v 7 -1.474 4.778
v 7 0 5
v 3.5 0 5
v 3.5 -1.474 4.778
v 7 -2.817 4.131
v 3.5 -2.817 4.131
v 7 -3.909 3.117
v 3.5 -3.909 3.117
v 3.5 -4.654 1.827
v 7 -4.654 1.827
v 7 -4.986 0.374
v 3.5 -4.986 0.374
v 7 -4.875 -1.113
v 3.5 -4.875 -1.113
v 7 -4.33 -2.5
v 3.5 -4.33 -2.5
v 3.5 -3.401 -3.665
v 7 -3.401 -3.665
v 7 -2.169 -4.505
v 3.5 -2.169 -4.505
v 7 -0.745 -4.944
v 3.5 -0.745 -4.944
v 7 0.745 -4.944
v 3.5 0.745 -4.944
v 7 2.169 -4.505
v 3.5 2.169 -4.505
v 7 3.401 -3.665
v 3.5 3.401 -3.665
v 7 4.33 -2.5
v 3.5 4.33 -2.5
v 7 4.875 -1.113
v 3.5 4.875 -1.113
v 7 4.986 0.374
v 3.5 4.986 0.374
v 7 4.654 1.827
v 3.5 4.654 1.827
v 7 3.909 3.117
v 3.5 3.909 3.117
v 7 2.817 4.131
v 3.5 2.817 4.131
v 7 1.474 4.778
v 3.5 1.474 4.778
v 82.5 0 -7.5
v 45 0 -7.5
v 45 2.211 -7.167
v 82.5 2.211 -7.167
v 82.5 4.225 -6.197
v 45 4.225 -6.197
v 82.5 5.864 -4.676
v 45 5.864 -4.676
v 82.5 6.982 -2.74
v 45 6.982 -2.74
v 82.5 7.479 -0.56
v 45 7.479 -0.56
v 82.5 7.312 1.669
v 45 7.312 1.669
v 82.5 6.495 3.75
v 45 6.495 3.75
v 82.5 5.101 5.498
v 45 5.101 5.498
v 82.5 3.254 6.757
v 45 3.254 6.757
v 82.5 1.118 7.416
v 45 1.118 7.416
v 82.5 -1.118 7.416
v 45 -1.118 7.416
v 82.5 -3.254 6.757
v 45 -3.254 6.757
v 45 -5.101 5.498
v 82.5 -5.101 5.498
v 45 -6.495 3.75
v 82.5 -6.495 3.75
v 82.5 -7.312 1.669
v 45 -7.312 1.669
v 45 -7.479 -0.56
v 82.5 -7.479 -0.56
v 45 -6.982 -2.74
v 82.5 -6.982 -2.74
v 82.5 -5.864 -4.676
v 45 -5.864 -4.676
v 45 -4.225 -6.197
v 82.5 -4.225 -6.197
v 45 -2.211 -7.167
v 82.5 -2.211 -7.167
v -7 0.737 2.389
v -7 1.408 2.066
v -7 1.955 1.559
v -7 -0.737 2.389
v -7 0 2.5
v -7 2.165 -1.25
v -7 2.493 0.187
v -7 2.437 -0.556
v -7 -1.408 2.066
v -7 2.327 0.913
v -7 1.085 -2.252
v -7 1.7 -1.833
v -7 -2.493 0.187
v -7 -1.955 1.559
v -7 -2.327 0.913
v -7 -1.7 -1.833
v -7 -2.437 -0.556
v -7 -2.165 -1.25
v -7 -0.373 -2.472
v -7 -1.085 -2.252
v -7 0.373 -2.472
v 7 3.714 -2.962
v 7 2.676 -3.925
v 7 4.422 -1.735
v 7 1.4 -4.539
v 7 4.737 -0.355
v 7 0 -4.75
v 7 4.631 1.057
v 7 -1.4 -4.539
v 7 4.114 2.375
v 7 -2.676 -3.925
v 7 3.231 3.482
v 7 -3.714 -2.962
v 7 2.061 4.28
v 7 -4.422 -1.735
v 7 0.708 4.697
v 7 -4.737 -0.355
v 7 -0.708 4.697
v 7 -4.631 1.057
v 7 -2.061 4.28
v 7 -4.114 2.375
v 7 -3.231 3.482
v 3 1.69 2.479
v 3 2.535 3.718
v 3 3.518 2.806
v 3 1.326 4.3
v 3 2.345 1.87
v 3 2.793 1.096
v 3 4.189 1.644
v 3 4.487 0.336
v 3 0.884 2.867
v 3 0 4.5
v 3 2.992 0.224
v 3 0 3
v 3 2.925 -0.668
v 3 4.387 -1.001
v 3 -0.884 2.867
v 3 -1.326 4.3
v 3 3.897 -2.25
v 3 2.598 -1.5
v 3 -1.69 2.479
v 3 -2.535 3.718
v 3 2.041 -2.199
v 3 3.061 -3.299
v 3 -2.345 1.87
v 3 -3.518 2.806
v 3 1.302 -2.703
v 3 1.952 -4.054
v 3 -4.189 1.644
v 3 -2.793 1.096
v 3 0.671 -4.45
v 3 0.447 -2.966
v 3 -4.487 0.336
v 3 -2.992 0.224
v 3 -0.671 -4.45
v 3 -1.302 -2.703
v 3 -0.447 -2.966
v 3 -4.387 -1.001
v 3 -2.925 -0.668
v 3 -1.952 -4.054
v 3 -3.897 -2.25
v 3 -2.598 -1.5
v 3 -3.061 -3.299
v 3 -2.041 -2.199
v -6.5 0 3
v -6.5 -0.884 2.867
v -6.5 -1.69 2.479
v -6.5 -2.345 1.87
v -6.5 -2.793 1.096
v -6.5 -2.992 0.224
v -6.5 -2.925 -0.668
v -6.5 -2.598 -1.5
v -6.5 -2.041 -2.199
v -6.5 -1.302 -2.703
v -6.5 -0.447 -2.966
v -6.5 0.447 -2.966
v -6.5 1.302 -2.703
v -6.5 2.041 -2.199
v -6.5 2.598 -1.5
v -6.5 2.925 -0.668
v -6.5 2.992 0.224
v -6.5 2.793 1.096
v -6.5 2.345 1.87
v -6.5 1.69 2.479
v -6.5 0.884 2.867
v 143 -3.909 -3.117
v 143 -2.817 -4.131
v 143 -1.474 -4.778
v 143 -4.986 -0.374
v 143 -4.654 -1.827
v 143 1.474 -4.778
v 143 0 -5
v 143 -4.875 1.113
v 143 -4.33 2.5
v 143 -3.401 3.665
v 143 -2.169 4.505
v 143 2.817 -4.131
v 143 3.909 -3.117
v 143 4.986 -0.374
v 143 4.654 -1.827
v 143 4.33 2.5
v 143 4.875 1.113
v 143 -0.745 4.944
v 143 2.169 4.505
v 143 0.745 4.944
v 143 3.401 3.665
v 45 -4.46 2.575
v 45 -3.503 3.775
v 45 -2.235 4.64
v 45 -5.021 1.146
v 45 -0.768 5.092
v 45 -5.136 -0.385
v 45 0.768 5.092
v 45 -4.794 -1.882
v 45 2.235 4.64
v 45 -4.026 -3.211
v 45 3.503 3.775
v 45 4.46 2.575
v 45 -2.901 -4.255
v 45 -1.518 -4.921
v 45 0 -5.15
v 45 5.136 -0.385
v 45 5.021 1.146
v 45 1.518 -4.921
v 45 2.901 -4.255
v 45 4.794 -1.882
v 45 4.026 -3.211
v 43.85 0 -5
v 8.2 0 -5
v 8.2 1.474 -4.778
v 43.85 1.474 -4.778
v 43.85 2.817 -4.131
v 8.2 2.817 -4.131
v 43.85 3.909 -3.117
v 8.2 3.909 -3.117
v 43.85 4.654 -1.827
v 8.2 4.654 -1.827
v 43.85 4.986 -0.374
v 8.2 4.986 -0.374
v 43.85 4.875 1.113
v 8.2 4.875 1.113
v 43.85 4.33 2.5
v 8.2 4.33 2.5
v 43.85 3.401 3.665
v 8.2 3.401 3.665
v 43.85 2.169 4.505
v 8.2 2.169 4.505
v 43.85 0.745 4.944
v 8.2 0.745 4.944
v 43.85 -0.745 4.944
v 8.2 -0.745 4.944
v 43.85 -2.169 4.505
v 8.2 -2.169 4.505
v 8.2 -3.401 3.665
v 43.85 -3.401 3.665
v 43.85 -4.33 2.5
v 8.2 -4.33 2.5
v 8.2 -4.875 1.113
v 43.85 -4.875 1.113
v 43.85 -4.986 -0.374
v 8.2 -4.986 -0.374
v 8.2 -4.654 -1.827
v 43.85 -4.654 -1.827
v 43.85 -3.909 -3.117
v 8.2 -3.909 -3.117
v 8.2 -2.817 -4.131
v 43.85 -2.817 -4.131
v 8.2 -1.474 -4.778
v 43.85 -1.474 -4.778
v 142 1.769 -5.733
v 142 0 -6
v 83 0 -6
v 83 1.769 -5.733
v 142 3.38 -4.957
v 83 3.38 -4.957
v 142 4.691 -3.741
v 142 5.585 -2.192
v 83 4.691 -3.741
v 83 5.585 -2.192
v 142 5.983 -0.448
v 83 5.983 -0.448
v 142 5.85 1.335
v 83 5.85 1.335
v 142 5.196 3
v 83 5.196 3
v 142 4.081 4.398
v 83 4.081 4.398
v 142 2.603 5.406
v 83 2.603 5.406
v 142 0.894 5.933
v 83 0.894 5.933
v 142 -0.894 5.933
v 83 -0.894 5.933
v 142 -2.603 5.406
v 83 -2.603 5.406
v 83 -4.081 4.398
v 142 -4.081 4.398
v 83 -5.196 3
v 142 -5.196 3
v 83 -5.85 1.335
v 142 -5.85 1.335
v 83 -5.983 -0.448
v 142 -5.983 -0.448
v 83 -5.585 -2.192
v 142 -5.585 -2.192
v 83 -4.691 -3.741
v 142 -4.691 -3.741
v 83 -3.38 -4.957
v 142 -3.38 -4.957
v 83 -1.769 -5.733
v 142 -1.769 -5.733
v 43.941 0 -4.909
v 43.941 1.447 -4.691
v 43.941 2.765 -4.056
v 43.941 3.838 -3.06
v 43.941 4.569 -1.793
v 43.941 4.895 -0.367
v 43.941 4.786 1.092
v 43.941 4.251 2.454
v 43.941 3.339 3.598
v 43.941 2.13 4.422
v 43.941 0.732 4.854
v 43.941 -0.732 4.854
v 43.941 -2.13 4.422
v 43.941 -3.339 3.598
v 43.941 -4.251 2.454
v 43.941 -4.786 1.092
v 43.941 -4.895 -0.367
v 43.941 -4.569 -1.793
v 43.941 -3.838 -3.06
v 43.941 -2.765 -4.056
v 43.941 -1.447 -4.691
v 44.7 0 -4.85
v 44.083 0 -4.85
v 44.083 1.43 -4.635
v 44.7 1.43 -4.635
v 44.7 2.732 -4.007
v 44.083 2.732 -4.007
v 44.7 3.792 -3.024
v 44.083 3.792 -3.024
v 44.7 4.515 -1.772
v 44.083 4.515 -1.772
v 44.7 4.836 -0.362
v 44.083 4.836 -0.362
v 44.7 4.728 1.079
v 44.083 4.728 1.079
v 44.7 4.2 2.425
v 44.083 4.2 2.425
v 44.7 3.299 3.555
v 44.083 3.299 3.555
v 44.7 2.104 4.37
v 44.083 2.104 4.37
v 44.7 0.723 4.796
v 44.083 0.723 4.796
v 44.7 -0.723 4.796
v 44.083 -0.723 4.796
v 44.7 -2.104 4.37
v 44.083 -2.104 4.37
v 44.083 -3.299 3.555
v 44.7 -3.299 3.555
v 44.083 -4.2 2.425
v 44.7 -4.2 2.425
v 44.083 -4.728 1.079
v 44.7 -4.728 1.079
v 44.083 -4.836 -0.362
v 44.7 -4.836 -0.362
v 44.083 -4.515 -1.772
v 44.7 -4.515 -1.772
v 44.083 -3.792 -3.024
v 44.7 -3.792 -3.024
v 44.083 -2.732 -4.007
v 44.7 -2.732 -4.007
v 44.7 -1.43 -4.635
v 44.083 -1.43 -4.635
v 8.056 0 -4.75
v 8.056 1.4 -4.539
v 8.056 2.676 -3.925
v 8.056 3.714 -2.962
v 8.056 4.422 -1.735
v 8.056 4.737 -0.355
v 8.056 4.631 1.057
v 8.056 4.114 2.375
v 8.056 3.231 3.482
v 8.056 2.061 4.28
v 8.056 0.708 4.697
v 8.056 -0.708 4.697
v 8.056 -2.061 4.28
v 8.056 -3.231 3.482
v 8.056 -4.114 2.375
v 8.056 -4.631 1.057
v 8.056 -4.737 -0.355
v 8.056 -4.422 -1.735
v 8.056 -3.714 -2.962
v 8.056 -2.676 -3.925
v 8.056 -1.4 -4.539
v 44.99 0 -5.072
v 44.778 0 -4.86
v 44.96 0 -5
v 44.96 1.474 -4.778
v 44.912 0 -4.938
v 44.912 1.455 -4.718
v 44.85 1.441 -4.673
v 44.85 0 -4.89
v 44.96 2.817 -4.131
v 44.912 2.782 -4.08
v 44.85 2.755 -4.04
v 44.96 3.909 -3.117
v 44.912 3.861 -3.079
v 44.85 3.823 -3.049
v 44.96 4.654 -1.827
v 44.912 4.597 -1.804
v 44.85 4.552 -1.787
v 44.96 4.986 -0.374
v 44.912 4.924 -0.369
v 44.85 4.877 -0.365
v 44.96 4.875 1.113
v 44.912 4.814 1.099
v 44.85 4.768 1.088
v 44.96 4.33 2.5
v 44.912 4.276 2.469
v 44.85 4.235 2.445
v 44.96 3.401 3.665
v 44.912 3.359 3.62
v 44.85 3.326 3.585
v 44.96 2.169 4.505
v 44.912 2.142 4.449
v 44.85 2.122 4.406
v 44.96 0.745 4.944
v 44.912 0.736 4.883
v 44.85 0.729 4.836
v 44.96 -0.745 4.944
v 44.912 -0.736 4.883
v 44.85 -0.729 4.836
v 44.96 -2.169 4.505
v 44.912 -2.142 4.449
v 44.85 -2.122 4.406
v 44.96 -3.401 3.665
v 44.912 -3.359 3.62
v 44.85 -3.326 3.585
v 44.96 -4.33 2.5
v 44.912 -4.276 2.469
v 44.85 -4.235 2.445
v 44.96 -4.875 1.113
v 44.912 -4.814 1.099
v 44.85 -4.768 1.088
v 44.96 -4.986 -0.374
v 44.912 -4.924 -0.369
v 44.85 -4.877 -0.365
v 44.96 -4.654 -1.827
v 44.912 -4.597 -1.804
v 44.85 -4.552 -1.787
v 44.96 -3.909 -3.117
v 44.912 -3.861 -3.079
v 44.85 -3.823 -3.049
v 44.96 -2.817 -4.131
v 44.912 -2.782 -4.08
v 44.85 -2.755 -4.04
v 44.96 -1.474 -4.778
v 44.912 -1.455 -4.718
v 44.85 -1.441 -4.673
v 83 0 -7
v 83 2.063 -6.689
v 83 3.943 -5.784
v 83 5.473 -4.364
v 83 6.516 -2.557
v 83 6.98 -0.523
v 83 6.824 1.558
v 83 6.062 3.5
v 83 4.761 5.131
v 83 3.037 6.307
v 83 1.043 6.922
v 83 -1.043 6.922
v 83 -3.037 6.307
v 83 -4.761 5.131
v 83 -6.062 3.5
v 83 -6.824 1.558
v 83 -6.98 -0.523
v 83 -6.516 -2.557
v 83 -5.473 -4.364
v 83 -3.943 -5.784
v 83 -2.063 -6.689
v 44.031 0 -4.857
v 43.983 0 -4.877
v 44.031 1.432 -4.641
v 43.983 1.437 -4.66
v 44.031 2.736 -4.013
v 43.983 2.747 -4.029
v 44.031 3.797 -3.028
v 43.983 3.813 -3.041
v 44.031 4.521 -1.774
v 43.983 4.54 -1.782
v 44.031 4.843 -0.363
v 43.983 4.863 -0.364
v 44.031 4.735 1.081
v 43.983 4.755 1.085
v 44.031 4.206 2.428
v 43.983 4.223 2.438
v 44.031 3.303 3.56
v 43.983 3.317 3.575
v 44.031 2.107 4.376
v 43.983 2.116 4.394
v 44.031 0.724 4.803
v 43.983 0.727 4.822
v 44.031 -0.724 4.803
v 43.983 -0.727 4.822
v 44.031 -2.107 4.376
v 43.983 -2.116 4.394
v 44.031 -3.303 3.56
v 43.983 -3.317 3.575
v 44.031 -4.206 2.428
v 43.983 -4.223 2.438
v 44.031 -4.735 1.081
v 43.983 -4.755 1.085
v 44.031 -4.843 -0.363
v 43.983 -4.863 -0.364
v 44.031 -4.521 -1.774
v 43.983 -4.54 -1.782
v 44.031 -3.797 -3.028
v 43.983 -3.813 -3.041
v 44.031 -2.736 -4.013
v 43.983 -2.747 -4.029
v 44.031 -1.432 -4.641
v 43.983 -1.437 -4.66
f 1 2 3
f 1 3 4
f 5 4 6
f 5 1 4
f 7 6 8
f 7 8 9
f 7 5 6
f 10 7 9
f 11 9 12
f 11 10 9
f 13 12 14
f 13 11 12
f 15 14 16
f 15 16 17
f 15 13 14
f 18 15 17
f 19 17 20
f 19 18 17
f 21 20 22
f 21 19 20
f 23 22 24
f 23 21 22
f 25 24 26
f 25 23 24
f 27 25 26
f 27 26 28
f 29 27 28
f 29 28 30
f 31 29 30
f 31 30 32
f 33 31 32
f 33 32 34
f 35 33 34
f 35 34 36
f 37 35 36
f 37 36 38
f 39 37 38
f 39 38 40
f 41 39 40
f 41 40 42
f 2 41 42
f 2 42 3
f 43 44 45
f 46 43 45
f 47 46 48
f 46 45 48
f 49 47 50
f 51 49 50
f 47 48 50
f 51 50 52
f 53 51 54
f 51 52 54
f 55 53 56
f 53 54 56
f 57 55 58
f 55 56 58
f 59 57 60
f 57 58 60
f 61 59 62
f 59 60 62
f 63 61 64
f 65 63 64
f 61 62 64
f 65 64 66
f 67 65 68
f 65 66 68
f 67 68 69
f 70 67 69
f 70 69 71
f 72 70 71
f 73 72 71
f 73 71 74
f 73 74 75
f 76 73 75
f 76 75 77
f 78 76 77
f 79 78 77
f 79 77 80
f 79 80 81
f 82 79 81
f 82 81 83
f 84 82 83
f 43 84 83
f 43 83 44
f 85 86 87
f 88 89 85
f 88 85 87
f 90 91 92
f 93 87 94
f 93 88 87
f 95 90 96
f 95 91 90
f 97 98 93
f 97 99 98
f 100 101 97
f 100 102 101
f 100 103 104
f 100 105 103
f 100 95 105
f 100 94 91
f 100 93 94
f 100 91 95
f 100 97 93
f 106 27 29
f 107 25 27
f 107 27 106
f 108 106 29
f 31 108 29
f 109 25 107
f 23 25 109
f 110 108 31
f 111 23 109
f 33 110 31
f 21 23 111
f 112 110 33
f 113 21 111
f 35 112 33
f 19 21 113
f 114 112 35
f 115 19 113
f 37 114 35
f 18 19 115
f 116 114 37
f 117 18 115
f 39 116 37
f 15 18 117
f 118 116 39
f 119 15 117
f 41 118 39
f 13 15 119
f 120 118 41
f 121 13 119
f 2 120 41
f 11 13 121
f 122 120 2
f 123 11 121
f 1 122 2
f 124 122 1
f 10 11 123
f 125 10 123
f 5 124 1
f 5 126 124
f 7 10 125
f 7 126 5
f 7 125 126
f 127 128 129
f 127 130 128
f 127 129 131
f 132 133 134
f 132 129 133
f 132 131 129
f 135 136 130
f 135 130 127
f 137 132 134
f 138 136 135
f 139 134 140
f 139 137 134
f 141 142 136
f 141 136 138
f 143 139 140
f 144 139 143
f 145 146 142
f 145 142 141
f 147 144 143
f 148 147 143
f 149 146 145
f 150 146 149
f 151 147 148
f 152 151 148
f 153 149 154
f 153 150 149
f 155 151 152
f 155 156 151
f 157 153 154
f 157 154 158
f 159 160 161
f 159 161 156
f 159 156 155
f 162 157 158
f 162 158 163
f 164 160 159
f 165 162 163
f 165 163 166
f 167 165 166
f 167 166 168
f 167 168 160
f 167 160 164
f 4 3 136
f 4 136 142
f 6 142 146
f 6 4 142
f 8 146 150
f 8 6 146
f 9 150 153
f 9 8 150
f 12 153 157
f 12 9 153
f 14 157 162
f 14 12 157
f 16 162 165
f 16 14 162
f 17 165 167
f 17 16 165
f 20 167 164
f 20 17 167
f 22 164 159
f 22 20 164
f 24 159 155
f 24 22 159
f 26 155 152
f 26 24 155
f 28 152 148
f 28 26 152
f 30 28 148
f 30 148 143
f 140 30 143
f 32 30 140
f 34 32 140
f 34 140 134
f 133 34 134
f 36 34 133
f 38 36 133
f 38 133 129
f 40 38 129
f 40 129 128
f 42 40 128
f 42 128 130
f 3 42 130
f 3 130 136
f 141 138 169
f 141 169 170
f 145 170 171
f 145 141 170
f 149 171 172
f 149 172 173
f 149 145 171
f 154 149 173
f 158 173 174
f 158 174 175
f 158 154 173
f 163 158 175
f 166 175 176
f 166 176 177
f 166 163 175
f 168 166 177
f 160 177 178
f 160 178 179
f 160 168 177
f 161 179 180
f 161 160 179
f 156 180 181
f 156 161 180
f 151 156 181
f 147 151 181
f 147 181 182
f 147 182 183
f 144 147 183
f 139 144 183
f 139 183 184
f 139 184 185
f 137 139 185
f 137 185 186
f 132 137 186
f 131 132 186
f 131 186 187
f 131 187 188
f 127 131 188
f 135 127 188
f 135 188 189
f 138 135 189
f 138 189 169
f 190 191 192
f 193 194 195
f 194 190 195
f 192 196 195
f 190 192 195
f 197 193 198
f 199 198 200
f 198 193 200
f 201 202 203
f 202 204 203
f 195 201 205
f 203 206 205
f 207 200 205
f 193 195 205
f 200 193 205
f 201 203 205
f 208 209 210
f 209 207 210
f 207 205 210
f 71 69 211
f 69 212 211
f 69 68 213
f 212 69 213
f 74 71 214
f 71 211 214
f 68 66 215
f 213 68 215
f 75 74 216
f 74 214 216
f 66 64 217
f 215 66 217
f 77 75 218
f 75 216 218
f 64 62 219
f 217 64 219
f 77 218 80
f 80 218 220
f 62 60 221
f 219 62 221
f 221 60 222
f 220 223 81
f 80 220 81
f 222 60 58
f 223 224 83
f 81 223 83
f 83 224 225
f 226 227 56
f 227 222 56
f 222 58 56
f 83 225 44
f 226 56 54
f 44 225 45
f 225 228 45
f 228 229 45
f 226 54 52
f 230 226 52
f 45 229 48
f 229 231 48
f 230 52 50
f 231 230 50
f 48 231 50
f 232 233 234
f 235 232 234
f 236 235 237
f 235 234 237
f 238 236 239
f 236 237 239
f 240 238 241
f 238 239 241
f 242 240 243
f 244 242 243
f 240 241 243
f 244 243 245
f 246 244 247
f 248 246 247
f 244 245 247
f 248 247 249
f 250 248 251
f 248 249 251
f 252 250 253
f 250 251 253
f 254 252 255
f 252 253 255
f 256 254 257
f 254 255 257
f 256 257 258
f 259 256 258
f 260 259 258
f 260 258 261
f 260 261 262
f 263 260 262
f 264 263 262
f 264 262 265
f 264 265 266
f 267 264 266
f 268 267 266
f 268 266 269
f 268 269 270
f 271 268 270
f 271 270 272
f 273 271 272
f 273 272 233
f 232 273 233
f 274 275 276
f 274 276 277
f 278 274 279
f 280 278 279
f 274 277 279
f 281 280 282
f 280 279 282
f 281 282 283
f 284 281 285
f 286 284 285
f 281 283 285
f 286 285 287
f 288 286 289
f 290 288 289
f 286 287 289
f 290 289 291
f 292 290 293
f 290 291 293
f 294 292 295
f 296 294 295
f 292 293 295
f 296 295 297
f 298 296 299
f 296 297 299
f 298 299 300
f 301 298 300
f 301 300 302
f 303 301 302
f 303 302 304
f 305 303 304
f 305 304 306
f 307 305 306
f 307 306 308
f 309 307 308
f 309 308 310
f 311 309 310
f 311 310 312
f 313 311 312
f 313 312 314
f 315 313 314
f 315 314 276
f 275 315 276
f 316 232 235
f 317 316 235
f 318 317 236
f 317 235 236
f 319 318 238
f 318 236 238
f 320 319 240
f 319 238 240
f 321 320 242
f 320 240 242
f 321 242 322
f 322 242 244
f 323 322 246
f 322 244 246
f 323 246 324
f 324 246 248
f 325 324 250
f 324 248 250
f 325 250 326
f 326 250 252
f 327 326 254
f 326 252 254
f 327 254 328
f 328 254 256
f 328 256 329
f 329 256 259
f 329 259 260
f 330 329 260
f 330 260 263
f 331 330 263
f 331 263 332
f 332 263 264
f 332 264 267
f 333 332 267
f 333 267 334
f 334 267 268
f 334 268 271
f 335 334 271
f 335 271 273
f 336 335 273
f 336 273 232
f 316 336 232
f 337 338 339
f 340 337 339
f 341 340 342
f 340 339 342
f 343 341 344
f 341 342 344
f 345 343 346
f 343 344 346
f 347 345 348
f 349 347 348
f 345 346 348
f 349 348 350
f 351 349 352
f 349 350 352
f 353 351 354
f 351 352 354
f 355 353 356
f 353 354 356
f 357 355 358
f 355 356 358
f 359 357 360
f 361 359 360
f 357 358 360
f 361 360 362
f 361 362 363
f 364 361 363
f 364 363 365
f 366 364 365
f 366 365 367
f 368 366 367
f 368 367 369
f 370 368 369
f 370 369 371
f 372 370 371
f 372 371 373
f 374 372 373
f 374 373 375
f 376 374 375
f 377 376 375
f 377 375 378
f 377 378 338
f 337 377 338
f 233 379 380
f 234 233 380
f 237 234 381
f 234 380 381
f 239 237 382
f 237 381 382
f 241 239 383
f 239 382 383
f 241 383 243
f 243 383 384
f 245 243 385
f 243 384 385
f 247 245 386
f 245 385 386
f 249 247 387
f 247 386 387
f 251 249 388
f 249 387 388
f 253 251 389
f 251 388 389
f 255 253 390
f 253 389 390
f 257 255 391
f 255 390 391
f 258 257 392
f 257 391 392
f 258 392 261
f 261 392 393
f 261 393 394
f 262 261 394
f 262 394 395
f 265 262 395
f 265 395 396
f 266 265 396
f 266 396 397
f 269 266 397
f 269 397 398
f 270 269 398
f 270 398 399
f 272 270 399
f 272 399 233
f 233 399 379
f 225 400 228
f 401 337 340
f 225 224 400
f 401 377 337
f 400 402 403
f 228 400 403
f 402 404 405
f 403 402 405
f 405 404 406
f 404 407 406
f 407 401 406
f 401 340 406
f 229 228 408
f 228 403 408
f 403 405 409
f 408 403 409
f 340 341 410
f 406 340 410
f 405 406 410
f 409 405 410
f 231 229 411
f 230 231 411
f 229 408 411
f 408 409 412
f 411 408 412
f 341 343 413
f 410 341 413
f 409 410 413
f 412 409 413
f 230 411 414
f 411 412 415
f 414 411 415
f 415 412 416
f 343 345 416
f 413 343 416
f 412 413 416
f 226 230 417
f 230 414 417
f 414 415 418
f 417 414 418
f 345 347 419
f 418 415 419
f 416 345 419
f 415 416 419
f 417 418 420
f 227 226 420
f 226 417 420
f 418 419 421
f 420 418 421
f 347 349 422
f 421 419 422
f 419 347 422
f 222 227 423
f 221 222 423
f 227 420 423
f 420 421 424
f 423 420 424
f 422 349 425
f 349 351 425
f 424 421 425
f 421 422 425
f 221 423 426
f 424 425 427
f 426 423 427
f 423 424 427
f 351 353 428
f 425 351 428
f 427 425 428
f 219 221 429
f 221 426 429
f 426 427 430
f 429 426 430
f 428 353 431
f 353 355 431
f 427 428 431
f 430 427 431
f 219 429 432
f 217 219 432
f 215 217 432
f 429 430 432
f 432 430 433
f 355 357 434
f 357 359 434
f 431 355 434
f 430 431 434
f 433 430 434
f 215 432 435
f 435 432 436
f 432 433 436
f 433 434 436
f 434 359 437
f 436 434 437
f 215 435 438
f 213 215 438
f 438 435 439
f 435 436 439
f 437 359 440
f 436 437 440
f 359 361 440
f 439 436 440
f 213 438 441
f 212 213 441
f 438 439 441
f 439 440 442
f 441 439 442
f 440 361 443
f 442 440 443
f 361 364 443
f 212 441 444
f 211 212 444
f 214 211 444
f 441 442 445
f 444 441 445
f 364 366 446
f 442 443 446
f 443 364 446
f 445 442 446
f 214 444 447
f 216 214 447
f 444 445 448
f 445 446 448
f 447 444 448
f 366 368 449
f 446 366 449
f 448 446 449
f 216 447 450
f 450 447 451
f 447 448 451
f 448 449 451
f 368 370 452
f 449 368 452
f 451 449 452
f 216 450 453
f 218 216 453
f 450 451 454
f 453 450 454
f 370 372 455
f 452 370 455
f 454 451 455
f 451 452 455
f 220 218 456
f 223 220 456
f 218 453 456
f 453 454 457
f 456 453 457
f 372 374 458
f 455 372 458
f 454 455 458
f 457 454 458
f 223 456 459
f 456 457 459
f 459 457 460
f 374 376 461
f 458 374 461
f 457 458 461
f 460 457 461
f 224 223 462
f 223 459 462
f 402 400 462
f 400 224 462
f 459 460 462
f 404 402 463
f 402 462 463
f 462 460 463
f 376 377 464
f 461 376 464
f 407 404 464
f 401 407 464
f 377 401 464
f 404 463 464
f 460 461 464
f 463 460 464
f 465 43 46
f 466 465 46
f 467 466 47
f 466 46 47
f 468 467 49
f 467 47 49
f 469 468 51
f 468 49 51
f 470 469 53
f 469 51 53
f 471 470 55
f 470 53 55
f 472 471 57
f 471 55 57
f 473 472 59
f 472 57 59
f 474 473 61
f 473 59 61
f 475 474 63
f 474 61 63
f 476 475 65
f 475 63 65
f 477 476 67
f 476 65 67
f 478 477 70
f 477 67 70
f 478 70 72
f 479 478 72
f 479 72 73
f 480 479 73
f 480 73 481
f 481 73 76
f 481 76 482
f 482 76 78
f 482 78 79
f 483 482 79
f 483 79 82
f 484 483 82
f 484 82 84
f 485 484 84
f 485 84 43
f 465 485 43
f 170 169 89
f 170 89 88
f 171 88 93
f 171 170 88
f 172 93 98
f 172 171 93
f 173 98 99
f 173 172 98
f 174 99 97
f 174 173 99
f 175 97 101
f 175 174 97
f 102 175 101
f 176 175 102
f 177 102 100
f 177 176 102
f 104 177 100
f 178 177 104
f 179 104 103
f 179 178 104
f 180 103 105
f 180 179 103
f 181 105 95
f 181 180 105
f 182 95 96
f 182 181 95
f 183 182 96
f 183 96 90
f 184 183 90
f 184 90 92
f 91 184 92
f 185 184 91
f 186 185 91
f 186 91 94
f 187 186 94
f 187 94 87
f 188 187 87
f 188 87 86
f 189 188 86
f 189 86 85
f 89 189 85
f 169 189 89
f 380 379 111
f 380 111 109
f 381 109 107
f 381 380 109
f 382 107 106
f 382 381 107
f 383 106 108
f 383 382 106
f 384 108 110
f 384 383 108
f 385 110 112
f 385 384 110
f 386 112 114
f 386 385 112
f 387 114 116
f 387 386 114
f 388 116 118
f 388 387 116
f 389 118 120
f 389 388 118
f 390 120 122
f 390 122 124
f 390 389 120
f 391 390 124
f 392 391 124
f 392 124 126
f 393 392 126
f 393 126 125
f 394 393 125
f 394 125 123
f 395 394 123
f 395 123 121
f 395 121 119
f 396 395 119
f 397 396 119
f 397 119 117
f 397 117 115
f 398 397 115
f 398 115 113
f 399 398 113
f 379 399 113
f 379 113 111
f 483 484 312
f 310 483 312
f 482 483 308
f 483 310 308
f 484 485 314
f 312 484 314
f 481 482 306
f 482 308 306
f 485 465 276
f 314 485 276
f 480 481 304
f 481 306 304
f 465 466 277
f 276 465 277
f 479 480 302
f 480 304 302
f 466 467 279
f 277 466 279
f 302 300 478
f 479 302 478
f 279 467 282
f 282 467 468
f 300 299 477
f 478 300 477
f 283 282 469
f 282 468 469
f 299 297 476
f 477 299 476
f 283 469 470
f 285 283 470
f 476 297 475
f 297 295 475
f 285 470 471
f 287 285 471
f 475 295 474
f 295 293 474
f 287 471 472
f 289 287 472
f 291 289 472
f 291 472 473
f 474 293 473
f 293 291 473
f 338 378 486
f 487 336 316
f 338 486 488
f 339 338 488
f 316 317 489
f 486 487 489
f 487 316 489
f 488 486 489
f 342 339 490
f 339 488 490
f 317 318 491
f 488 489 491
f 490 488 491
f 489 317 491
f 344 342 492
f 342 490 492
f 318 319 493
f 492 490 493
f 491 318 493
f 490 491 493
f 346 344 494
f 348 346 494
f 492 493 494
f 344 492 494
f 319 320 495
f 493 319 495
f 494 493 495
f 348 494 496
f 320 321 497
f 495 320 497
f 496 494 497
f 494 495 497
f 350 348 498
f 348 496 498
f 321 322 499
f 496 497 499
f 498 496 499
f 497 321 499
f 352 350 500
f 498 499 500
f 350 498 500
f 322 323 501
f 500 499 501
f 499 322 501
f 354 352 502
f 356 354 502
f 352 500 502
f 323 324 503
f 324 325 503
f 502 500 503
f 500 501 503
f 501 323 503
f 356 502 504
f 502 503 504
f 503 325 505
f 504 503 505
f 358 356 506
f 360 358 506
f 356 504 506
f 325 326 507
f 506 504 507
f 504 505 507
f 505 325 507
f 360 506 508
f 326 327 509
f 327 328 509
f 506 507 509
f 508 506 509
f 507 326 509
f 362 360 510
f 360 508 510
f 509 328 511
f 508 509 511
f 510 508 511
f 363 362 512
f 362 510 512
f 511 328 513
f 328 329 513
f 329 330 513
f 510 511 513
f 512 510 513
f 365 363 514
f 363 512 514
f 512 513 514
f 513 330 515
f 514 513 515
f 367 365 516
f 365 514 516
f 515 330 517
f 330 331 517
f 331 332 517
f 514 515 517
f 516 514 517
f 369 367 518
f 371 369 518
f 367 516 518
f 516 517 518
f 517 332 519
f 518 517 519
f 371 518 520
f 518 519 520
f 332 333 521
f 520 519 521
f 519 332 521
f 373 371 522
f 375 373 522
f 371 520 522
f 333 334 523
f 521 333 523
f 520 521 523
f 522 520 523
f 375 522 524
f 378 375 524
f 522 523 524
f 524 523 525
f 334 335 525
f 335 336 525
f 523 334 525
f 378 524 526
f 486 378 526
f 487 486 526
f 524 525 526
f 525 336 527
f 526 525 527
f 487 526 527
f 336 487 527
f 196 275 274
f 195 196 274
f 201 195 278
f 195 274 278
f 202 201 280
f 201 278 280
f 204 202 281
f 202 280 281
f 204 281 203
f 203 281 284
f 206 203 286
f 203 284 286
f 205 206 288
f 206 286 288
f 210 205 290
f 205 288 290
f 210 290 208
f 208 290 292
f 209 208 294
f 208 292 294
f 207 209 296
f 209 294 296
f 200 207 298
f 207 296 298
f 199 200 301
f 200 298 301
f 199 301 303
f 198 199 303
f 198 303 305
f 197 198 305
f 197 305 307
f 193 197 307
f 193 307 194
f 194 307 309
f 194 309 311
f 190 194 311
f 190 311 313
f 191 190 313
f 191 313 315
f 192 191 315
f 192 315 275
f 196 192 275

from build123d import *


with BuildPart() as part:
    # Skizze1 → Rotation1 (revolve)
    with BuildSketch(Plane(origin=(0, 0, 0), x_dir=(1, 0, 0), z_dir=(0, 1, 0))):
        with BuildLine():
            Line((-7, 2.5), (-7, 0))
            Line((-7, 0), (143, 0))
            Line((143, 0), (143, 5))
            Line((143, 5), (142, 6))
            Line((142, 6), (83, 6))
            Line((83, 6), (83, 7))
            Line((83, 7), (82.5, 7.5))
            Line((82.5, 7.5), (45, 7.5))
            Line((45, 7.5), (45, 5.15))
            ThreePointArc((45, 5.15), (44.912132034, 4.937867966), (44.7, 4.85))
            Line((44.7, 4.85), (44.082842712, 4.85))
            ThreePointArc((44.082842712, 4.85), (44.006306026, 4.865224093), (43.941421356, 4.908578644))
            Line((43.941421356, 4.908578644), (43.85, 5))
            Line((43.85, 5), (8.2, 5))
            Line((8.2, 5), (8.055662433, 4.75))
            Line((8.055662433, 4.75), (7, 4.75))
            Line((7, 4.75), (7, 5))
            Line((7, 5), (3.5, 5))
            Line((3.5, 5), (3, 4.5))
            Line((3, 4.5), (3, 3))
            Line((3, 3), (-6.5, 3))
            Line((-6.5, 3), (-7, 2.5))
        make_face()
    revolve(axis=Axis((65, 0, 0), (1, 0, 0)))


solid = part.part
